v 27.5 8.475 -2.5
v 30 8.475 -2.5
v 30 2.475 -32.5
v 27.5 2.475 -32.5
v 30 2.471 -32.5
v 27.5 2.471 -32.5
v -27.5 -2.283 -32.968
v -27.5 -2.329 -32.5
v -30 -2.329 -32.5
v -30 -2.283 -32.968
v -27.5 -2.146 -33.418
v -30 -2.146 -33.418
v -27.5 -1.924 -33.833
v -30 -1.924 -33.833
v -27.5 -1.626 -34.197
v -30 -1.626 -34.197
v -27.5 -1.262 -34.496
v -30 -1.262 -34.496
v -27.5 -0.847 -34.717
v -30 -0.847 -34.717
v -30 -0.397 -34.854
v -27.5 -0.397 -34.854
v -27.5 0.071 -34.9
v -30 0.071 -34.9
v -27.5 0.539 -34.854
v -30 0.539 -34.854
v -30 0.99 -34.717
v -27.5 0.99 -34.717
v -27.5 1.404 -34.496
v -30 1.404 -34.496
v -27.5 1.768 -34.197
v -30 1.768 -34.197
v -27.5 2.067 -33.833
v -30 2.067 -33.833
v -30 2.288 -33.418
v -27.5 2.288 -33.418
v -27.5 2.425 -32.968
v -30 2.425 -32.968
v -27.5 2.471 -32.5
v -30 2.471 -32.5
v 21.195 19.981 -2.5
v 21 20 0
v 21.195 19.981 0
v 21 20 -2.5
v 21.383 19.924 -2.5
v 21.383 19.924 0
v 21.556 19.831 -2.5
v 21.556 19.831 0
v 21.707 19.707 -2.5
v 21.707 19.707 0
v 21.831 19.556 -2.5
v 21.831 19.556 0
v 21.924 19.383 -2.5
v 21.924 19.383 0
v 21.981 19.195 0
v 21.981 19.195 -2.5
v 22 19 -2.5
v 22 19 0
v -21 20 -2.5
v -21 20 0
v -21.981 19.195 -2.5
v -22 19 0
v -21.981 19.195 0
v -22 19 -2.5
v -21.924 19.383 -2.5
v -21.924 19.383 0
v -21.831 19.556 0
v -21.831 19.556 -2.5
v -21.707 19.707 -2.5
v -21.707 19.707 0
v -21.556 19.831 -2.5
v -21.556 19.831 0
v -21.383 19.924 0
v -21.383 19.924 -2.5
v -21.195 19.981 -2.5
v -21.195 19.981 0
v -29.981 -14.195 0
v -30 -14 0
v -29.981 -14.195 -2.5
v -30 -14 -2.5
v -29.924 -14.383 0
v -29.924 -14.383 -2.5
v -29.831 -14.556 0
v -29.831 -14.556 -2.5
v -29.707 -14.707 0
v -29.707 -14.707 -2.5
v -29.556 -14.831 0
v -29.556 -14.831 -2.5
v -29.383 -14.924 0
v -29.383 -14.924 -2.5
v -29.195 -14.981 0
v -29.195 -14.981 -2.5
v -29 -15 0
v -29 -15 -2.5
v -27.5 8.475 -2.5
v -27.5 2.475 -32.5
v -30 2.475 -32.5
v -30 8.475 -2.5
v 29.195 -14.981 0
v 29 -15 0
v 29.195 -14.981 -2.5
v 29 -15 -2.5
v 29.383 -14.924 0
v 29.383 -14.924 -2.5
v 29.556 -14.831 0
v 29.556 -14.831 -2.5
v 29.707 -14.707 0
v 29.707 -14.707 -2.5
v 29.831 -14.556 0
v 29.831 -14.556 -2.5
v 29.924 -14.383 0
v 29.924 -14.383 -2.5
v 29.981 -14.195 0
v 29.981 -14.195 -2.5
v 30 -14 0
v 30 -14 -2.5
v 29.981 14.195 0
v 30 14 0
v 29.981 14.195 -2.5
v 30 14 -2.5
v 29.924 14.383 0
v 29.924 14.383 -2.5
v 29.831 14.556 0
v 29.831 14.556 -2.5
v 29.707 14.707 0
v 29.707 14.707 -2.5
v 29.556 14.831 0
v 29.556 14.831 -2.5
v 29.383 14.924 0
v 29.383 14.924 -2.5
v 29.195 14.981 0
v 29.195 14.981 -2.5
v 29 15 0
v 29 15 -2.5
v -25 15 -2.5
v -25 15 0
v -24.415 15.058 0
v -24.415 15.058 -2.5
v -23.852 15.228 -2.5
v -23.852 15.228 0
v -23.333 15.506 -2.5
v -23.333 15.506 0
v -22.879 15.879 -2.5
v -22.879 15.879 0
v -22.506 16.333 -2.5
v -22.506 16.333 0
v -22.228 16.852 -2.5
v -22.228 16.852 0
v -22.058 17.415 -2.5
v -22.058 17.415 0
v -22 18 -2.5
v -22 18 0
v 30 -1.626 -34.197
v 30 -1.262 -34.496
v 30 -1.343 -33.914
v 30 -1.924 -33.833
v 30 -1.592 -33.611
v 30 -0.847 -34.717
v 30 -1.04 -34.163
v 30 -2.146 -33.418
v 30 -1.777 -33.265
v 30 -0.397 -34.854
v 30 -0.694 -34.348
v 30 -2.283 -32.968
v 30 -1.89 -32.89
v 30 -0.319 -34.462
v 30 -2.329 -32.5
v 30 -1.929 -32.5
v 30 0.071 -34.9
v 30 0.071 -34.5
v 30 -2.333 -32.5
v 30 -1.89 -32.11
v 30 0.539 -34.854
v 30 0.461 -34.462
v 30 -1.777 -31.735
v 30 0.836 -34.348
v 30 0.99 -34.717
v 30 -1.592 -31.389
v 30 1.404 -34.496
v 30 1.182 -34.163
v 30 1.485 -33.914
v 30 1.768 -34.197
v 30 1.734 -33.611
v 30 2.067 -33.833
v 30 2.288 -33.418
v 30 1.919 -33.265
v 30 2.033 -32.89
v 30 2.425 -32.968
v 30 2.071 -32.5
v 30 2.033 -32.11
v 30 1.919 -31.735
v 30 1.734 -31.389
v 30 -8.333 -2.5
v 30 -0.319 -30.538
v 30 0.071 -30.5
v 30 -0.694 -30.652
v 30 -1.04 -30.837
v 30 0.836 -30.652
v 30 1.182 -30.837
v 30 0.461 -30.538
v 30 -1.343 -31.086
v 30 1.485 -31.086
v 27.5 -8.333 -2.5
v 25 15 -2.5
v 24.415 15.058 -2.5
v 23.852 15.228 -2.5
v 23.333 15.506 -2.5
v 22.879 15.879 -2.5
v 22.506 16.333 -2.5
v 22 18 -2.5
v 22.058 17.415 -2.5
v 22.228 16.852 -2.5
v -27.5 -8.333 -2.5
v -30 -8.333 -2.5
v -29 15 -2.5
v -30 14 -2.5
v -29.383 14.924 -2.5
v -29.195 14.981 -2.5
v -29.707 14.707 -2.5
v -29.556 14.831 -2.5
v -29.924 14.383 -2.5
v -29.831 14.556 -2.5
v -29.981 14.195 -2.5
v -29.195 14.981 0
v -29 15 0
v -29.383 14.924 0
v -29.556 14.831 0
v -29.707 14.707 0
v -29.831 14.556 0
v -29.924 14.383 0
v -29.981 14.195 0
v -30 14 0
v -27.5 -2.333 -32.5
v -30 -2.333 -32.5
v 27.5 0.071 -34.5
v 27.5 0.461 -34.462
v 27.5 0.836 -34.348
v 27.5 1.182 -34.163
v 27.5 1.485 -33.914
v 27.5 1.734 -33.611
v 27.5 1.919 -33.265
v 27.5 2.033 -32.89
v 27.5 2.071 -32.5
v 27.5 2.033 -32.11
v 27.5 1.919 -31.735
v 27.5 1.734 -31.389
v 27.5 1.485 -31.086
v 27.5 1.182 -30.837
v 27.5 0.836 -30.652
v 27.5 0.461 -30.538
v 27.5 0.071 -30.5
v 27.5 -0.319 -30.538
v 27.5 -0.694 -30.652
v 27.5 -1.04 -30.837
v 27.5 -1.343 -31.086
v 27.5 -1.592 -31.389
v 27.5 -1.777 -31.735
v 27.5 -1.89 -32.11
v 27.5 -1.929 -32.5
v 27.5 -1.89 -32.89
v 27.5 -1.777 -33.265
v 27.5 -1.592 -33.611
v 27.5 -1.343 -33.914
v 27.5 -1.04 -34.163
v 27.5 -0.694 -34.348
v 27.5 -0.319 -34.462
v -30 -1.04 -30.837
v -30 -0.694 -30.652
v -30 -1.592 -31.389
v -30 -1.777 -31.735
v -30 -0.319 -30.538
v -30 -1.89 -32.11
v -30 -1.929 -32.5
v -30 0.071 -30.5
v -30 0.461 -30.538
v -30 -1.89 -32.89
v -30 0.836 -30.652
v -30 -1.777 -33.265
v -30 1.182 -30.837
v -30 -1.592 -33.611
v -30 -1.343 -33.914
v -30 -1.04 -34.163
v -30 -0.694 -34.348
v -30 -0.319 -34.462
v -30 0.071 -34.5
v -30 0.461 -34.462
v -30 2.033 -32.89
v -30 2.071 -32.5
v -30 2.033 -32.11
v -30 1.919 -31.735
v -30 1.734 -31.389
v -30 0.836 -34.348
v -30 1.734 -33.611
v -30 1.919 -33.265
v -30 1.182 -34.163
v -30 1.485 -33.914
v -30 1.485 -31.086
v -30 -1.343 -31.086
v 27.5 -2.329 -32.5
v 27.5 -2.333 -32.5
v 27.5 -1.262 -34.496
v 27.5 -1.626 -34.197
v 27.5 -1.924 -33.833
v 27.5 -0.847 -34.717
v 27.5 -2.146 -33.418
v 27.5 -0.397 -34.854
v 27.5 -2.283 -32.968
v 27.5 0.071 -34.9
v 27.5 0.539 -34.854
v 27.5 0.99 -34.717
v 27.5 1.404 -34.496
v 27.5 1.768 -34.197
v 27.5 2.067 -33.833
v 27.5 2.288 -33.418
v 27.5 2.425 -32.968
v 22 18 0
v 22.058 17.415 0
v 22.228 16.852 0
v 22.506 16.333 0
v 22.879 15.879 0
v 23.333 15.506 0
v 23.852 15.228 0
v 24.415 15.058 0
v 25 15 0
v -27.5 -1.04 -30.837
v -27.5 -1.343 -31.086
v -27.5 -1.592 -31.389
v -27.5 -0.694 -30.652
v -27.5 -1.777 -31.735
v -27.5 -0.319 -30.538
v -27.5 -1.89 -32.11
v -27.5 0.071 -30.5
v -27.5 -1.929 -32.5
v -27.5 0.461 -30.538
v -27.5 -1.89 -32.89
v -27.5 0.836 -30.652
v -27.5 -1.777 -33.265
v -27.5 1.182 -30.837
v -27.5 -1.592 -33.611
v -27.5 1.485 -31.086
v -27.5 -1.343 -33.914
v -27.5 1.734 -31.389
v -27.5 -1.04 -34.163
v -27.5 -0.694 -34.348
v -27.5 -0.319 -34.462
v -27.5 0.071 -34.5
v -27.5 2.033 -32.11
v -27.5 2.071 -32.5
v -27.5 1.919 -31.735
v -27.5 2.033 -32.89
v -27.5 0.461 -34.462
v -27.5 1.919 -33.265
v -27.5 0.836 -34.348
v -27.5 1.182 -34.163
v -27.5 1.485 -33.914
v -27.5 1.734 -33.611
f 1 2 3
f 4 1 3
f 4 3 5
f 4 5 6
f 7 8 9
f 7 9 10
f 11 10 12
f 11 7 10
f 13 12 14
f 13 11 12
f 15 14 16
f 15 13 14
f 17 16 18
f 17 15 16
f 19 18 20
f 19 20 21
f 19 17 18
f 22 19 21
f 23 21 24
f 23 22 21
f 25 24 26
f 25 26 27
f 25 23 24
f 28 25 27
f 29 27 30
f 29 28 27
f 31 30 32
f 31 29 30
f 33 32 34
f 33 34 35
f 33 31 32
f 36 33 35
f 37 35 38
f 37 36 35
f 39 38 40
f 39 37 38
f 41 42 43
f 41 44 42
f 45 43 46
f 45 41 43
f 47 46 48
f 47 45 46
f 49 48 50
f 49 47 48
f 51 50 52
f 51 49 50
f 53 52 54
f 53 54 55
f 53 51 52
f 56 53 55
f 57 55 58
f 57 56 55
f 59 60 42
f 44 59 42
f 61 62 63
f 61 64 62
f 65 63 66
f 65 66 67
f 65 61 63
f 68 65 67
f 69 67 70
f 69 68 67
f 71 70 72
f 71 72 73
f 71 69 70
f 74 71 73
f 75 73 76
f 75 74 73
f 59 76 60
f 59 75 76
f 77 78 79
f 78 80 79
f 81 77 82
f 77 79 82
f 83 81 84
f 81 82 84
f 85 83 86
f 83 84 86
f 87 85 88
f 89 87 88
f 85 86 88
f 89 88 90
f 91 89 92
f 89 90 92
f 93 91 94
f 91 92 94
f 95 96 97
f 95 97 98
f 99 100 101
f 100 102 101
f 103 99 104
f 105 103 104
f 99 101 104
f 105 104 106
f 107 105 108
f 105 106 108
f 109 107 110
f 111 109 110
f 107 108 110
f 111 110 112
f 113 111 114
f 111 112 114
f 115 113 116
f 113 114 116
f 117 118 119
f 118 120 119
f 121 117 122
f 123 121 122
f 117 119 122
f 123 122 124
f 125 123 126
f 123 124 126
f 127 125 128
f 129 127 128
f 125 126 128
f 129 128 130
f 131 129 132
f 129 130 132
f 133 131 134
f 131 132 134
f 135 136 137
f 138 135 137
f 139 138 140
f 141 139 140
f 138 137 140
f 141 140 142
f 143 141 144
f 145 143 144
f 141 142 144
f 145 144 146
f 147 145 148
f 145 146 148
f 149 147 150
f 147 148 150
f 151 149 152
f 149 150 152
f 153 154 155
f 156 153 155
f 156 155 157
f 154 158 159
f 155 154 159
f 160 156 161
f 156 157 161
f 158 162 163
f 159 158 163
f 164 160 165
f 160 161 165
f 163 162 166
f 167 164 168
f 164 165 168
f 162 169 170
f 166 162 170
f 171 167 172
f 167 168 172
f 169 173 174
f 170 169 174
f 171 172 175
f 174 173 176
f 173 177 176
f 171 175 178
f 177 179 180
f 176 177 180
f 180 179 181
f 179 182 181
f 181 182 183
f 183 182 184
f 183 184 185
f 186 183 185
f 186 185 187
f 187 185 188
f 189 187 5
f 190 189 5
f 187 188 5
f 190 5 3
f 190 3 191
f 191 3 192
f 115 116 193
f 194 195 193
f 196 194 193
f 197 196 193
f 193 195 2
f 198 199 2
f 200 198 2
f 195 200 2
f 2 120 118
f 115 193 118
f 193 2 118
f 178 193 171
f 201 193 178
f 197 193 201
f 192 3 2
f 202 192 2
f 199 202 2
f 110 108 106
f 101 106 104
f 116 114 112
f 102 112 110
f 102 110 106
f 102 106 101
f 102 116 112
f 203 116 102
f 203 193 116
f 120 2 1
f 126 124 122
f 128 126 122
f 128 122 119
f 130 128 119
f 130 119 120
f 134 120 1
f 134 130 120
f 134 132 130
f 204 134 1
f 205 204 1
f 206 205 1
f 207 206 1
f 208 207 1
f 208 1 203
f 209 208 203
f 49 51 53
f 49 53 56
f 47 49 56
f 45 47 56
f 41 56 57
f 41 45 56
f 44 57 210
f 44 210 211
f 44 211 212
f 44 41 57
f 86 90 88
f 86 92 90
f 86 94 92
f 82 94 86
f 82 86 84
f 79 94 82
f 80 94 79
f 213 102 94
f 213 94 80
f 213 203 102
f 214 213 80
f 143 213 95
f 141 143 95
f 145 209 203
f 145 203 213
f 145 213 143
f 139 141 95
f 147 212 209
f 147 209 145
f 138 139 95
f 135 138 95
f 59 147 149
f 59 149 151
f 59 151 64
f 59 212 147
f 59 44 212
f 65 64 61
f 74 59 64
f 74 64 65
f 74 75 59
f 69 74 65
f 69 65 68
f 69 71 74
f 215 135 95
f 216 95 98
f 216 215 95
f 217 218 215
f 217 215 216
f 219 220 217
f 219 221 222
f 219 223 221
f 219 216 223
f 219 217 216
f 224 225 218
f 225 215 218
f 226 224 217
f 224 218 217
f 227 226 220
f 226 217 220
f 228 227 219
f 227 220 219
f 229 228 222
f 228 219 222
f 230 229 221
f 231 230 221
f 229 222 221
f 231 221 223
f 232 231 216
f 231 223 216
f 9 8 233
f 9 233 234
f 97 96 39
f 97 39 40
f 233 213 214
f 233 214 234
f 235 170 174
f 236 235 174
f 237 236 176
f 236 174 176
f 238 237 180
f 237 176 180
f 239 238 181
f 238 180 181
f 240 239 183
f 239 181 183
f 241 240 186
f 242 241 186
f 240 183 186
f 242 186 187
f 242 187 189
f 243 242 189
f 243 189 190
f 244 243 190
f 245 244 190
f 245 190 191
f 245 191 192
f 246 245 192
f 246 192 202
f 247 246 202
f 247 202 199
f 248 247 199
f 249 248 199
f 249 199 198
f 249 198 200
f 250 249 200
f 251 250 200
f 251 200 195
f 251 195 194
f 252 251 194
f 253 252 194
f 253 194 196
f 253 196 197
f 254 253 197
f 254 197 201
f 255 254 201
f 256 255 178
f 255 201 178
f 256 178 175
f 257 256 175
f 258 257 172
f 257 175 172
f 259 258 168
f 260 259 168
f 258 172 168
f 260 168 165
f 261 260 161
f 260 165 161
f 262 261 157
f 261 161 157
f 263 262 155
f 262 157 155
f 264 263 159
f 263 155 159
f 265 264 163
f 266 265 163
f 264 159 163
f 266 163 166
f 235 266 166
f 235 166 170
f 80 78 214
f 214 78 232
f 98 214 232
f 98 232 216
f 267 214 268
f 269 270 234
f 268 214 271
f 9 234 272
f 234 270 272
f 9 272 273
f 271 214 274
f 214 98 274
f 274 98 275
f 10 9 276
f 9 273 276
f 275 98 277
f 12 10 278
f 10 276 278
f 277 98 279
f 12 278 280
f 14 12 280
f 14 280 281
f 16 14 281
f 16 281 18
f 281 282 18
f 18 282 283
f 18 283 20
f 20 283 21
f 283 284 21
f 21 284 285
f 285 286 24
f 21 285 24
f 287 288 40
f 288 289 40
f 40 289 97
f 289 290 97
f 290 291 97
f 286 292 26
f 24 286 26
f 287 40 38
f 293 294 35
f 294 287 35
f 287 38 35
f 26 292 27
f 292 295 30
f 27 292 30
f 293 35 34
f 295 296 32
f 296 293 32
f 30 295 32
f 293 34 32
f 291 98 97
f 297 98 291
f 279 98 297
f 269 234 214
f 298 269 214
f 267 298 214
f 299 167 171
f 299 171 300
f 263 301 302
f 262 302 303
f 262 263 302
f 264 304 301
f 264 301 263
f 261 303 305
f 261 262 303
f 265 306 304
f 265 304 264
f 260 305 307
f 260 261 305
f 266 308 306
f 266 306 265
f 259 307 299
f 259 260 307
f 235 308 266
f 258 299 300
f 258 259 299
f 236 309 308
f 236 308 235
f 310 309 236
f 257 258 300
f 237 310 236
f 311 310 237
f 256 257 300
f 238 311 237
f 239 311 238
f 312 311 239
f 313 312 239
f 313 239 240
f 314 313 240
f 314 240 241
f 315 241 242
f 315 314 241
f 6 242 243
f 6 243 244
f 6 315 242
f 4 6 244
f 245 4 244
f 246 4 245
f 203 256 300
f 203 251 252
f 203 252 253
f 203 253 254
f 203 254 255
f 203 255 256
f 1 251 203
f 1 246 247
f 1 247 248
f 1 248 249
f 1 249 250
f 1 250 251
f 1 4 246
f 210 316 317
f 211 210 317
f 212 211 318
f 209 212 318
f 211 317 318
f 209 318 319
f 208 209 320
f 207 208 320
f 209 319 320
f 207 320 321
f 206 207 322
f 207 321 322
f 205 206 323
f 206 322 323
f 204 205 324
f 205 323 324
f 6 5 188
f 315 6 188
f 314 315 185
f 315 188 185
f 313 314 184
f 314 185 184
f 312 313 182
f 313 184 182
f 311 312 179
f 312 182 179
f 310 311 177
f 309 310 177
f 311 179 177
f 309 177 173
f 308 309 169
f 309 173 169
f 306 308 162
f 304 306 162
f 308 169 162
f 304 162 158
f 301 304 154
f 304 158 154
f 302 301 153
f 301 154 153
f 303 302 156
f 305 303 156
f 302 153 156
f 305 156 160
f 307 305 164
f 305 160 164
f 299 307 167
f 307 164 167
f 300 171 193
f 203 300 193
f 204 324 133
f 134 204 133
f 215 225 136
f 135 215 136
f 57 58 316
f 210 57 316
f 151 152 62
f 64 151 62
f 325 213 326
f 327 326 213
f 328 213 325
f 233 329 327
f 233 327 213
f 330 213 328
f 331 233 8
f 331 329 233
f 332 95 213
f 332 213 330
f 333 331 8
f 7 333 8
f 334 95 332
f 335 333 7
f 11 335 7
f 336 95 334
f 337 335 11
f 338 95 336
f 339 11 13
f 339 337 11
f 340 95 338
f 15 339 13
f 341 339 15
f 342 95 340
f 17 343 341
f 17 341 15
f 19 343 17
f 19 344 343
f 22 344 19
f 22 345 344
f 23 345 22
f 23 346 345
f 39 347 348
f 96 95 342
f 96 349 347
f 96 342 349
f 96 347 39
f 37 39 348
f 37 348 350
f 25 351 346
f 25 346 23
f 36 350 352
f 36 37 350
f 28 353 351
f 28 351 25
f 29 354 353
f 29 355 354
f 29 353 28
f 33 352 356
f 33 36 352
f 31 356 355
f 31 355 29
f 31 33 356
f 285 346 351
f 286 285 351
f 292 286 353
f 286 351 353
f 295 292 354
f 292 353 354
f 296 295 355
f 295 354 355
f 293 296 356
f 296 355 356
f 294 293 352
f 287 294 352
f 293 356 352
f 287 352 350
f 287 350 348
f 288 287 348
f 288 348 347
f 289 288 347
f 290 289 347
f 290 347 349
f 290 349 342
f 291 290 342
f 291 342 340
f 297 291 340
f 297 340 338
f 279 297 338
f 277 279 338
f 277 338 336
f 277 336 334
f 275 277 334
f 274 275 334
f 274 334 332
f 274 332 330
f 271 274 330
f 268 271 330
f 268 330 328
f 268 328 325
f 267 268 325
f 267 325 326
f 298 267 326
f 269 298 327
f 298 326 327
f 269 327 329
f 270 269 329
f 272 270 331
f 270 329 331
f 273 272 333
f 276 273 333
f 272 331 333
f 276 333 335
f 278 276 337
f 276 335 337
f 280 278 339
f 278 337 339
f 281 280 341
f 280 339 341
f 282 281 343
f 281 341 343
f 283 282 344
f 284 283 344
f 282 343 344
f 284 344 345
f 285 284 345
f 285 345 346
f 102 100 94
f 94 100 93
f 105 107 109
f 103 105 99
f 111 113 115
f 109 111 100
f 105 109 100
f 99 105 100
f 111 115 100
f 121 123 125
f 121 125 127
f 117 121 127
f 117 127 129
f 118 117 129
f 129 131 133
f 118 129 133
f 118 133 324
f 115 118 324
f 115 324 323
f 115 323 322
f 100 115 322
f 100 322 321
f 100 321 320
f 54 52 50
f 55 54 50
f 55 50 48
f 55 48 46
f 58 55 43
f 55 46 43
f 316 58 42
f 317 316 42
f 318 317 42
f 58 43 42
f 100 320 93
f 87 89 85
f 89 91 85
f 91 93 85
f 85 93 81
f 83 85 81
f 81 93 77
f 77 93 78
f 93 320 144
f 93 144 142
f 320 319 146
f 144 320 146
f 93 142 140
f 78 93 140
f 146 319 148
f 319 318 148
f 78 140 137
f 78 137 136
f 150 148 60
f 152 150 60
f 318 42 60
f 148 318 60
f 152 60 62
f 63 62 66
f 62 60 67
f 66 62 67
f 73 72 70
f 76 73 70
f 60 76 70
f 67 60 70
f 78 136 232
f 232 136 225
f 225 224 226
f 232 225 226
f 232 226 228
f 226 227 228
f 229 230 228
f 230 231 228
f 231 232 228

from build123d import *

# Parameters (mm, degrees)
SALIENTE_EXTRUIR1_DEPTH = 2.5
REDONDEO1_R             = 1
REDONDEO2_R             = 1
CROQUIS3_W              = 2.5
CROQUIS3_H              = 4.8076308
SALIENTE_EXTRUIR2_DEPTH = 30
SALIENTE_EXTRUIR3_DEPTH = 2.5
SALIENTE_EXTRUIR4_START = -2.5
SALIENTE_EXTRUIR4_DEPTH = 2.5
CROQUIS6_R              = 2
CORTAR_EXTRUIR1_DEPTH   = 100


with BuildPart() as part:
    # Croquis2 → Saliente-Extruir1 (new body)
    with BuildSketch(Plane.XY):
        with BuildLine():
            Line((30, -15), (-30, -15))
            Line((-30, -15), (-30, 15))
            Line((-30, 15), (-25, 15))
            ThreePointArc((-25, 15), (-22.878679656, 15.878679656), (-22, 18))
            Line((-22, 18), (-22, 20))
            Line((-22, 20), (22, 20))
            Line((22, 20), (22, 18))
            ThreePointArc((22, 18), (22.878679656, 15.878679656), (25, 15))
            Line((25, 15), (30, 15))
            Line((30, 15), (30, -15))
        make_face()
    extrude(amount=-SALIENTE_EXTRUIR1_DEPTH)

    # Redondeo1
    redondeo1_edges = [part.edges().sort_by_distance(p)[0] for p in [
        (-22, 20, -1.25),
        (22, 20, -1.25),
    ]]
    fillet(redondeo1_edges, radius=REDONDEO1_R)

    # Redondeo2
    redondeo2_edges = [part.edges().sort_by_distance(p)[0] for p in [
        (30, 15, -1.25),
        (30, -15, -1.25),
        (-30, -15, -1.25),
        (-30, 15, -1.25),
    ]]
    fillet(redondeo2_edges, radius=REDONDEO2_R)

    # Croquis3 → Saliente-Extruir2 (add)
    with BuildSketch(Plane(origin=(0, 0, -2.5), x_dir=(-1, 0, 0), z_dir=(0, 0, -1))):
        with Locations((28.75, 0.071092992)):
            Rectangle(CROQUIS3_W, CROQUIS3_H)
        with Locations((-28.75, 0.071092992)):
            Rectangle(CROQUIS3_W, CROQUIS3_H)
    extrude(amount=SALIENTE_EXTRUIR2_DEPTH)

    # Croquis4 → Saliente-Extruir3 (add)
    with BuildSketch(Plane(origin=(30, 0, 0), x_dir=(0, 0, -1), z_dir=(1, 0, 0))):
        with BuildLine():
            Line((32.5, -2.332722408), (2.5, -8.332722408))
            Line((2.5, -8.332722408), (2.5, 2.474908392))
            Line((2.5, 2.474908392), (2.5, 8.474908392))
            Line((2.5, 8.474908392), (32.5, 2.474908392))
            Line((32.5, 2.474908392), (32.5, 2.471092992))
            ThreePointArc((32.5, 2.471092992), (34.9, 0.071092992), (32.5, -2.328907008))
            Line((32.5, -2.328907008), (32.5, -2.332722408))
        make_face()
    extrude(amount=-SALIENTE_EXTRUIR3_DEPTH)

    # Croquis5 → Saliente-Extruir4 (add)
    with BuildSketch(Plane.ZY.offset(30).offset(SALIENTE_EXTRUIR4_START)):
        with BuildLine():
            Line((-2.5, 8.474908392), (-2.5, -8.332722408))
            Line((-2.5, -8.332722408), (-32.5, -2.332722408))
            Line((-32.5, -2.332722408), (-32.5, -2.328907008))
            ThreePointArc((-32.5, -2.328907008), (-34.9, 0.071092992), (-32.5, 2.471092992))
            Line((-32.5, 2.471092992), (-32.5, 2.474908392))
            Line((-32.5, 2.474908392), (-2.5, 8.474908392))
        make_face()
    extrude(amount=SALIENTE_EXTRUIR4_DEPTH)

    # Croquis6 → Cortar-Extruir1 (cut)
    with BuildSketch(Plane(origin=(30, 0, 0), x_dir=(0, 0, -1), z_dir=(1, 0, 0))):
        with Locations((32.5, 0.071092992)):
            Circle(CROQUIS6_R)
    extrude(amount=-CORTAR_EXTRUIR1_DEPTH, mode=Mode.SUBTRACT)


solid = part.part
